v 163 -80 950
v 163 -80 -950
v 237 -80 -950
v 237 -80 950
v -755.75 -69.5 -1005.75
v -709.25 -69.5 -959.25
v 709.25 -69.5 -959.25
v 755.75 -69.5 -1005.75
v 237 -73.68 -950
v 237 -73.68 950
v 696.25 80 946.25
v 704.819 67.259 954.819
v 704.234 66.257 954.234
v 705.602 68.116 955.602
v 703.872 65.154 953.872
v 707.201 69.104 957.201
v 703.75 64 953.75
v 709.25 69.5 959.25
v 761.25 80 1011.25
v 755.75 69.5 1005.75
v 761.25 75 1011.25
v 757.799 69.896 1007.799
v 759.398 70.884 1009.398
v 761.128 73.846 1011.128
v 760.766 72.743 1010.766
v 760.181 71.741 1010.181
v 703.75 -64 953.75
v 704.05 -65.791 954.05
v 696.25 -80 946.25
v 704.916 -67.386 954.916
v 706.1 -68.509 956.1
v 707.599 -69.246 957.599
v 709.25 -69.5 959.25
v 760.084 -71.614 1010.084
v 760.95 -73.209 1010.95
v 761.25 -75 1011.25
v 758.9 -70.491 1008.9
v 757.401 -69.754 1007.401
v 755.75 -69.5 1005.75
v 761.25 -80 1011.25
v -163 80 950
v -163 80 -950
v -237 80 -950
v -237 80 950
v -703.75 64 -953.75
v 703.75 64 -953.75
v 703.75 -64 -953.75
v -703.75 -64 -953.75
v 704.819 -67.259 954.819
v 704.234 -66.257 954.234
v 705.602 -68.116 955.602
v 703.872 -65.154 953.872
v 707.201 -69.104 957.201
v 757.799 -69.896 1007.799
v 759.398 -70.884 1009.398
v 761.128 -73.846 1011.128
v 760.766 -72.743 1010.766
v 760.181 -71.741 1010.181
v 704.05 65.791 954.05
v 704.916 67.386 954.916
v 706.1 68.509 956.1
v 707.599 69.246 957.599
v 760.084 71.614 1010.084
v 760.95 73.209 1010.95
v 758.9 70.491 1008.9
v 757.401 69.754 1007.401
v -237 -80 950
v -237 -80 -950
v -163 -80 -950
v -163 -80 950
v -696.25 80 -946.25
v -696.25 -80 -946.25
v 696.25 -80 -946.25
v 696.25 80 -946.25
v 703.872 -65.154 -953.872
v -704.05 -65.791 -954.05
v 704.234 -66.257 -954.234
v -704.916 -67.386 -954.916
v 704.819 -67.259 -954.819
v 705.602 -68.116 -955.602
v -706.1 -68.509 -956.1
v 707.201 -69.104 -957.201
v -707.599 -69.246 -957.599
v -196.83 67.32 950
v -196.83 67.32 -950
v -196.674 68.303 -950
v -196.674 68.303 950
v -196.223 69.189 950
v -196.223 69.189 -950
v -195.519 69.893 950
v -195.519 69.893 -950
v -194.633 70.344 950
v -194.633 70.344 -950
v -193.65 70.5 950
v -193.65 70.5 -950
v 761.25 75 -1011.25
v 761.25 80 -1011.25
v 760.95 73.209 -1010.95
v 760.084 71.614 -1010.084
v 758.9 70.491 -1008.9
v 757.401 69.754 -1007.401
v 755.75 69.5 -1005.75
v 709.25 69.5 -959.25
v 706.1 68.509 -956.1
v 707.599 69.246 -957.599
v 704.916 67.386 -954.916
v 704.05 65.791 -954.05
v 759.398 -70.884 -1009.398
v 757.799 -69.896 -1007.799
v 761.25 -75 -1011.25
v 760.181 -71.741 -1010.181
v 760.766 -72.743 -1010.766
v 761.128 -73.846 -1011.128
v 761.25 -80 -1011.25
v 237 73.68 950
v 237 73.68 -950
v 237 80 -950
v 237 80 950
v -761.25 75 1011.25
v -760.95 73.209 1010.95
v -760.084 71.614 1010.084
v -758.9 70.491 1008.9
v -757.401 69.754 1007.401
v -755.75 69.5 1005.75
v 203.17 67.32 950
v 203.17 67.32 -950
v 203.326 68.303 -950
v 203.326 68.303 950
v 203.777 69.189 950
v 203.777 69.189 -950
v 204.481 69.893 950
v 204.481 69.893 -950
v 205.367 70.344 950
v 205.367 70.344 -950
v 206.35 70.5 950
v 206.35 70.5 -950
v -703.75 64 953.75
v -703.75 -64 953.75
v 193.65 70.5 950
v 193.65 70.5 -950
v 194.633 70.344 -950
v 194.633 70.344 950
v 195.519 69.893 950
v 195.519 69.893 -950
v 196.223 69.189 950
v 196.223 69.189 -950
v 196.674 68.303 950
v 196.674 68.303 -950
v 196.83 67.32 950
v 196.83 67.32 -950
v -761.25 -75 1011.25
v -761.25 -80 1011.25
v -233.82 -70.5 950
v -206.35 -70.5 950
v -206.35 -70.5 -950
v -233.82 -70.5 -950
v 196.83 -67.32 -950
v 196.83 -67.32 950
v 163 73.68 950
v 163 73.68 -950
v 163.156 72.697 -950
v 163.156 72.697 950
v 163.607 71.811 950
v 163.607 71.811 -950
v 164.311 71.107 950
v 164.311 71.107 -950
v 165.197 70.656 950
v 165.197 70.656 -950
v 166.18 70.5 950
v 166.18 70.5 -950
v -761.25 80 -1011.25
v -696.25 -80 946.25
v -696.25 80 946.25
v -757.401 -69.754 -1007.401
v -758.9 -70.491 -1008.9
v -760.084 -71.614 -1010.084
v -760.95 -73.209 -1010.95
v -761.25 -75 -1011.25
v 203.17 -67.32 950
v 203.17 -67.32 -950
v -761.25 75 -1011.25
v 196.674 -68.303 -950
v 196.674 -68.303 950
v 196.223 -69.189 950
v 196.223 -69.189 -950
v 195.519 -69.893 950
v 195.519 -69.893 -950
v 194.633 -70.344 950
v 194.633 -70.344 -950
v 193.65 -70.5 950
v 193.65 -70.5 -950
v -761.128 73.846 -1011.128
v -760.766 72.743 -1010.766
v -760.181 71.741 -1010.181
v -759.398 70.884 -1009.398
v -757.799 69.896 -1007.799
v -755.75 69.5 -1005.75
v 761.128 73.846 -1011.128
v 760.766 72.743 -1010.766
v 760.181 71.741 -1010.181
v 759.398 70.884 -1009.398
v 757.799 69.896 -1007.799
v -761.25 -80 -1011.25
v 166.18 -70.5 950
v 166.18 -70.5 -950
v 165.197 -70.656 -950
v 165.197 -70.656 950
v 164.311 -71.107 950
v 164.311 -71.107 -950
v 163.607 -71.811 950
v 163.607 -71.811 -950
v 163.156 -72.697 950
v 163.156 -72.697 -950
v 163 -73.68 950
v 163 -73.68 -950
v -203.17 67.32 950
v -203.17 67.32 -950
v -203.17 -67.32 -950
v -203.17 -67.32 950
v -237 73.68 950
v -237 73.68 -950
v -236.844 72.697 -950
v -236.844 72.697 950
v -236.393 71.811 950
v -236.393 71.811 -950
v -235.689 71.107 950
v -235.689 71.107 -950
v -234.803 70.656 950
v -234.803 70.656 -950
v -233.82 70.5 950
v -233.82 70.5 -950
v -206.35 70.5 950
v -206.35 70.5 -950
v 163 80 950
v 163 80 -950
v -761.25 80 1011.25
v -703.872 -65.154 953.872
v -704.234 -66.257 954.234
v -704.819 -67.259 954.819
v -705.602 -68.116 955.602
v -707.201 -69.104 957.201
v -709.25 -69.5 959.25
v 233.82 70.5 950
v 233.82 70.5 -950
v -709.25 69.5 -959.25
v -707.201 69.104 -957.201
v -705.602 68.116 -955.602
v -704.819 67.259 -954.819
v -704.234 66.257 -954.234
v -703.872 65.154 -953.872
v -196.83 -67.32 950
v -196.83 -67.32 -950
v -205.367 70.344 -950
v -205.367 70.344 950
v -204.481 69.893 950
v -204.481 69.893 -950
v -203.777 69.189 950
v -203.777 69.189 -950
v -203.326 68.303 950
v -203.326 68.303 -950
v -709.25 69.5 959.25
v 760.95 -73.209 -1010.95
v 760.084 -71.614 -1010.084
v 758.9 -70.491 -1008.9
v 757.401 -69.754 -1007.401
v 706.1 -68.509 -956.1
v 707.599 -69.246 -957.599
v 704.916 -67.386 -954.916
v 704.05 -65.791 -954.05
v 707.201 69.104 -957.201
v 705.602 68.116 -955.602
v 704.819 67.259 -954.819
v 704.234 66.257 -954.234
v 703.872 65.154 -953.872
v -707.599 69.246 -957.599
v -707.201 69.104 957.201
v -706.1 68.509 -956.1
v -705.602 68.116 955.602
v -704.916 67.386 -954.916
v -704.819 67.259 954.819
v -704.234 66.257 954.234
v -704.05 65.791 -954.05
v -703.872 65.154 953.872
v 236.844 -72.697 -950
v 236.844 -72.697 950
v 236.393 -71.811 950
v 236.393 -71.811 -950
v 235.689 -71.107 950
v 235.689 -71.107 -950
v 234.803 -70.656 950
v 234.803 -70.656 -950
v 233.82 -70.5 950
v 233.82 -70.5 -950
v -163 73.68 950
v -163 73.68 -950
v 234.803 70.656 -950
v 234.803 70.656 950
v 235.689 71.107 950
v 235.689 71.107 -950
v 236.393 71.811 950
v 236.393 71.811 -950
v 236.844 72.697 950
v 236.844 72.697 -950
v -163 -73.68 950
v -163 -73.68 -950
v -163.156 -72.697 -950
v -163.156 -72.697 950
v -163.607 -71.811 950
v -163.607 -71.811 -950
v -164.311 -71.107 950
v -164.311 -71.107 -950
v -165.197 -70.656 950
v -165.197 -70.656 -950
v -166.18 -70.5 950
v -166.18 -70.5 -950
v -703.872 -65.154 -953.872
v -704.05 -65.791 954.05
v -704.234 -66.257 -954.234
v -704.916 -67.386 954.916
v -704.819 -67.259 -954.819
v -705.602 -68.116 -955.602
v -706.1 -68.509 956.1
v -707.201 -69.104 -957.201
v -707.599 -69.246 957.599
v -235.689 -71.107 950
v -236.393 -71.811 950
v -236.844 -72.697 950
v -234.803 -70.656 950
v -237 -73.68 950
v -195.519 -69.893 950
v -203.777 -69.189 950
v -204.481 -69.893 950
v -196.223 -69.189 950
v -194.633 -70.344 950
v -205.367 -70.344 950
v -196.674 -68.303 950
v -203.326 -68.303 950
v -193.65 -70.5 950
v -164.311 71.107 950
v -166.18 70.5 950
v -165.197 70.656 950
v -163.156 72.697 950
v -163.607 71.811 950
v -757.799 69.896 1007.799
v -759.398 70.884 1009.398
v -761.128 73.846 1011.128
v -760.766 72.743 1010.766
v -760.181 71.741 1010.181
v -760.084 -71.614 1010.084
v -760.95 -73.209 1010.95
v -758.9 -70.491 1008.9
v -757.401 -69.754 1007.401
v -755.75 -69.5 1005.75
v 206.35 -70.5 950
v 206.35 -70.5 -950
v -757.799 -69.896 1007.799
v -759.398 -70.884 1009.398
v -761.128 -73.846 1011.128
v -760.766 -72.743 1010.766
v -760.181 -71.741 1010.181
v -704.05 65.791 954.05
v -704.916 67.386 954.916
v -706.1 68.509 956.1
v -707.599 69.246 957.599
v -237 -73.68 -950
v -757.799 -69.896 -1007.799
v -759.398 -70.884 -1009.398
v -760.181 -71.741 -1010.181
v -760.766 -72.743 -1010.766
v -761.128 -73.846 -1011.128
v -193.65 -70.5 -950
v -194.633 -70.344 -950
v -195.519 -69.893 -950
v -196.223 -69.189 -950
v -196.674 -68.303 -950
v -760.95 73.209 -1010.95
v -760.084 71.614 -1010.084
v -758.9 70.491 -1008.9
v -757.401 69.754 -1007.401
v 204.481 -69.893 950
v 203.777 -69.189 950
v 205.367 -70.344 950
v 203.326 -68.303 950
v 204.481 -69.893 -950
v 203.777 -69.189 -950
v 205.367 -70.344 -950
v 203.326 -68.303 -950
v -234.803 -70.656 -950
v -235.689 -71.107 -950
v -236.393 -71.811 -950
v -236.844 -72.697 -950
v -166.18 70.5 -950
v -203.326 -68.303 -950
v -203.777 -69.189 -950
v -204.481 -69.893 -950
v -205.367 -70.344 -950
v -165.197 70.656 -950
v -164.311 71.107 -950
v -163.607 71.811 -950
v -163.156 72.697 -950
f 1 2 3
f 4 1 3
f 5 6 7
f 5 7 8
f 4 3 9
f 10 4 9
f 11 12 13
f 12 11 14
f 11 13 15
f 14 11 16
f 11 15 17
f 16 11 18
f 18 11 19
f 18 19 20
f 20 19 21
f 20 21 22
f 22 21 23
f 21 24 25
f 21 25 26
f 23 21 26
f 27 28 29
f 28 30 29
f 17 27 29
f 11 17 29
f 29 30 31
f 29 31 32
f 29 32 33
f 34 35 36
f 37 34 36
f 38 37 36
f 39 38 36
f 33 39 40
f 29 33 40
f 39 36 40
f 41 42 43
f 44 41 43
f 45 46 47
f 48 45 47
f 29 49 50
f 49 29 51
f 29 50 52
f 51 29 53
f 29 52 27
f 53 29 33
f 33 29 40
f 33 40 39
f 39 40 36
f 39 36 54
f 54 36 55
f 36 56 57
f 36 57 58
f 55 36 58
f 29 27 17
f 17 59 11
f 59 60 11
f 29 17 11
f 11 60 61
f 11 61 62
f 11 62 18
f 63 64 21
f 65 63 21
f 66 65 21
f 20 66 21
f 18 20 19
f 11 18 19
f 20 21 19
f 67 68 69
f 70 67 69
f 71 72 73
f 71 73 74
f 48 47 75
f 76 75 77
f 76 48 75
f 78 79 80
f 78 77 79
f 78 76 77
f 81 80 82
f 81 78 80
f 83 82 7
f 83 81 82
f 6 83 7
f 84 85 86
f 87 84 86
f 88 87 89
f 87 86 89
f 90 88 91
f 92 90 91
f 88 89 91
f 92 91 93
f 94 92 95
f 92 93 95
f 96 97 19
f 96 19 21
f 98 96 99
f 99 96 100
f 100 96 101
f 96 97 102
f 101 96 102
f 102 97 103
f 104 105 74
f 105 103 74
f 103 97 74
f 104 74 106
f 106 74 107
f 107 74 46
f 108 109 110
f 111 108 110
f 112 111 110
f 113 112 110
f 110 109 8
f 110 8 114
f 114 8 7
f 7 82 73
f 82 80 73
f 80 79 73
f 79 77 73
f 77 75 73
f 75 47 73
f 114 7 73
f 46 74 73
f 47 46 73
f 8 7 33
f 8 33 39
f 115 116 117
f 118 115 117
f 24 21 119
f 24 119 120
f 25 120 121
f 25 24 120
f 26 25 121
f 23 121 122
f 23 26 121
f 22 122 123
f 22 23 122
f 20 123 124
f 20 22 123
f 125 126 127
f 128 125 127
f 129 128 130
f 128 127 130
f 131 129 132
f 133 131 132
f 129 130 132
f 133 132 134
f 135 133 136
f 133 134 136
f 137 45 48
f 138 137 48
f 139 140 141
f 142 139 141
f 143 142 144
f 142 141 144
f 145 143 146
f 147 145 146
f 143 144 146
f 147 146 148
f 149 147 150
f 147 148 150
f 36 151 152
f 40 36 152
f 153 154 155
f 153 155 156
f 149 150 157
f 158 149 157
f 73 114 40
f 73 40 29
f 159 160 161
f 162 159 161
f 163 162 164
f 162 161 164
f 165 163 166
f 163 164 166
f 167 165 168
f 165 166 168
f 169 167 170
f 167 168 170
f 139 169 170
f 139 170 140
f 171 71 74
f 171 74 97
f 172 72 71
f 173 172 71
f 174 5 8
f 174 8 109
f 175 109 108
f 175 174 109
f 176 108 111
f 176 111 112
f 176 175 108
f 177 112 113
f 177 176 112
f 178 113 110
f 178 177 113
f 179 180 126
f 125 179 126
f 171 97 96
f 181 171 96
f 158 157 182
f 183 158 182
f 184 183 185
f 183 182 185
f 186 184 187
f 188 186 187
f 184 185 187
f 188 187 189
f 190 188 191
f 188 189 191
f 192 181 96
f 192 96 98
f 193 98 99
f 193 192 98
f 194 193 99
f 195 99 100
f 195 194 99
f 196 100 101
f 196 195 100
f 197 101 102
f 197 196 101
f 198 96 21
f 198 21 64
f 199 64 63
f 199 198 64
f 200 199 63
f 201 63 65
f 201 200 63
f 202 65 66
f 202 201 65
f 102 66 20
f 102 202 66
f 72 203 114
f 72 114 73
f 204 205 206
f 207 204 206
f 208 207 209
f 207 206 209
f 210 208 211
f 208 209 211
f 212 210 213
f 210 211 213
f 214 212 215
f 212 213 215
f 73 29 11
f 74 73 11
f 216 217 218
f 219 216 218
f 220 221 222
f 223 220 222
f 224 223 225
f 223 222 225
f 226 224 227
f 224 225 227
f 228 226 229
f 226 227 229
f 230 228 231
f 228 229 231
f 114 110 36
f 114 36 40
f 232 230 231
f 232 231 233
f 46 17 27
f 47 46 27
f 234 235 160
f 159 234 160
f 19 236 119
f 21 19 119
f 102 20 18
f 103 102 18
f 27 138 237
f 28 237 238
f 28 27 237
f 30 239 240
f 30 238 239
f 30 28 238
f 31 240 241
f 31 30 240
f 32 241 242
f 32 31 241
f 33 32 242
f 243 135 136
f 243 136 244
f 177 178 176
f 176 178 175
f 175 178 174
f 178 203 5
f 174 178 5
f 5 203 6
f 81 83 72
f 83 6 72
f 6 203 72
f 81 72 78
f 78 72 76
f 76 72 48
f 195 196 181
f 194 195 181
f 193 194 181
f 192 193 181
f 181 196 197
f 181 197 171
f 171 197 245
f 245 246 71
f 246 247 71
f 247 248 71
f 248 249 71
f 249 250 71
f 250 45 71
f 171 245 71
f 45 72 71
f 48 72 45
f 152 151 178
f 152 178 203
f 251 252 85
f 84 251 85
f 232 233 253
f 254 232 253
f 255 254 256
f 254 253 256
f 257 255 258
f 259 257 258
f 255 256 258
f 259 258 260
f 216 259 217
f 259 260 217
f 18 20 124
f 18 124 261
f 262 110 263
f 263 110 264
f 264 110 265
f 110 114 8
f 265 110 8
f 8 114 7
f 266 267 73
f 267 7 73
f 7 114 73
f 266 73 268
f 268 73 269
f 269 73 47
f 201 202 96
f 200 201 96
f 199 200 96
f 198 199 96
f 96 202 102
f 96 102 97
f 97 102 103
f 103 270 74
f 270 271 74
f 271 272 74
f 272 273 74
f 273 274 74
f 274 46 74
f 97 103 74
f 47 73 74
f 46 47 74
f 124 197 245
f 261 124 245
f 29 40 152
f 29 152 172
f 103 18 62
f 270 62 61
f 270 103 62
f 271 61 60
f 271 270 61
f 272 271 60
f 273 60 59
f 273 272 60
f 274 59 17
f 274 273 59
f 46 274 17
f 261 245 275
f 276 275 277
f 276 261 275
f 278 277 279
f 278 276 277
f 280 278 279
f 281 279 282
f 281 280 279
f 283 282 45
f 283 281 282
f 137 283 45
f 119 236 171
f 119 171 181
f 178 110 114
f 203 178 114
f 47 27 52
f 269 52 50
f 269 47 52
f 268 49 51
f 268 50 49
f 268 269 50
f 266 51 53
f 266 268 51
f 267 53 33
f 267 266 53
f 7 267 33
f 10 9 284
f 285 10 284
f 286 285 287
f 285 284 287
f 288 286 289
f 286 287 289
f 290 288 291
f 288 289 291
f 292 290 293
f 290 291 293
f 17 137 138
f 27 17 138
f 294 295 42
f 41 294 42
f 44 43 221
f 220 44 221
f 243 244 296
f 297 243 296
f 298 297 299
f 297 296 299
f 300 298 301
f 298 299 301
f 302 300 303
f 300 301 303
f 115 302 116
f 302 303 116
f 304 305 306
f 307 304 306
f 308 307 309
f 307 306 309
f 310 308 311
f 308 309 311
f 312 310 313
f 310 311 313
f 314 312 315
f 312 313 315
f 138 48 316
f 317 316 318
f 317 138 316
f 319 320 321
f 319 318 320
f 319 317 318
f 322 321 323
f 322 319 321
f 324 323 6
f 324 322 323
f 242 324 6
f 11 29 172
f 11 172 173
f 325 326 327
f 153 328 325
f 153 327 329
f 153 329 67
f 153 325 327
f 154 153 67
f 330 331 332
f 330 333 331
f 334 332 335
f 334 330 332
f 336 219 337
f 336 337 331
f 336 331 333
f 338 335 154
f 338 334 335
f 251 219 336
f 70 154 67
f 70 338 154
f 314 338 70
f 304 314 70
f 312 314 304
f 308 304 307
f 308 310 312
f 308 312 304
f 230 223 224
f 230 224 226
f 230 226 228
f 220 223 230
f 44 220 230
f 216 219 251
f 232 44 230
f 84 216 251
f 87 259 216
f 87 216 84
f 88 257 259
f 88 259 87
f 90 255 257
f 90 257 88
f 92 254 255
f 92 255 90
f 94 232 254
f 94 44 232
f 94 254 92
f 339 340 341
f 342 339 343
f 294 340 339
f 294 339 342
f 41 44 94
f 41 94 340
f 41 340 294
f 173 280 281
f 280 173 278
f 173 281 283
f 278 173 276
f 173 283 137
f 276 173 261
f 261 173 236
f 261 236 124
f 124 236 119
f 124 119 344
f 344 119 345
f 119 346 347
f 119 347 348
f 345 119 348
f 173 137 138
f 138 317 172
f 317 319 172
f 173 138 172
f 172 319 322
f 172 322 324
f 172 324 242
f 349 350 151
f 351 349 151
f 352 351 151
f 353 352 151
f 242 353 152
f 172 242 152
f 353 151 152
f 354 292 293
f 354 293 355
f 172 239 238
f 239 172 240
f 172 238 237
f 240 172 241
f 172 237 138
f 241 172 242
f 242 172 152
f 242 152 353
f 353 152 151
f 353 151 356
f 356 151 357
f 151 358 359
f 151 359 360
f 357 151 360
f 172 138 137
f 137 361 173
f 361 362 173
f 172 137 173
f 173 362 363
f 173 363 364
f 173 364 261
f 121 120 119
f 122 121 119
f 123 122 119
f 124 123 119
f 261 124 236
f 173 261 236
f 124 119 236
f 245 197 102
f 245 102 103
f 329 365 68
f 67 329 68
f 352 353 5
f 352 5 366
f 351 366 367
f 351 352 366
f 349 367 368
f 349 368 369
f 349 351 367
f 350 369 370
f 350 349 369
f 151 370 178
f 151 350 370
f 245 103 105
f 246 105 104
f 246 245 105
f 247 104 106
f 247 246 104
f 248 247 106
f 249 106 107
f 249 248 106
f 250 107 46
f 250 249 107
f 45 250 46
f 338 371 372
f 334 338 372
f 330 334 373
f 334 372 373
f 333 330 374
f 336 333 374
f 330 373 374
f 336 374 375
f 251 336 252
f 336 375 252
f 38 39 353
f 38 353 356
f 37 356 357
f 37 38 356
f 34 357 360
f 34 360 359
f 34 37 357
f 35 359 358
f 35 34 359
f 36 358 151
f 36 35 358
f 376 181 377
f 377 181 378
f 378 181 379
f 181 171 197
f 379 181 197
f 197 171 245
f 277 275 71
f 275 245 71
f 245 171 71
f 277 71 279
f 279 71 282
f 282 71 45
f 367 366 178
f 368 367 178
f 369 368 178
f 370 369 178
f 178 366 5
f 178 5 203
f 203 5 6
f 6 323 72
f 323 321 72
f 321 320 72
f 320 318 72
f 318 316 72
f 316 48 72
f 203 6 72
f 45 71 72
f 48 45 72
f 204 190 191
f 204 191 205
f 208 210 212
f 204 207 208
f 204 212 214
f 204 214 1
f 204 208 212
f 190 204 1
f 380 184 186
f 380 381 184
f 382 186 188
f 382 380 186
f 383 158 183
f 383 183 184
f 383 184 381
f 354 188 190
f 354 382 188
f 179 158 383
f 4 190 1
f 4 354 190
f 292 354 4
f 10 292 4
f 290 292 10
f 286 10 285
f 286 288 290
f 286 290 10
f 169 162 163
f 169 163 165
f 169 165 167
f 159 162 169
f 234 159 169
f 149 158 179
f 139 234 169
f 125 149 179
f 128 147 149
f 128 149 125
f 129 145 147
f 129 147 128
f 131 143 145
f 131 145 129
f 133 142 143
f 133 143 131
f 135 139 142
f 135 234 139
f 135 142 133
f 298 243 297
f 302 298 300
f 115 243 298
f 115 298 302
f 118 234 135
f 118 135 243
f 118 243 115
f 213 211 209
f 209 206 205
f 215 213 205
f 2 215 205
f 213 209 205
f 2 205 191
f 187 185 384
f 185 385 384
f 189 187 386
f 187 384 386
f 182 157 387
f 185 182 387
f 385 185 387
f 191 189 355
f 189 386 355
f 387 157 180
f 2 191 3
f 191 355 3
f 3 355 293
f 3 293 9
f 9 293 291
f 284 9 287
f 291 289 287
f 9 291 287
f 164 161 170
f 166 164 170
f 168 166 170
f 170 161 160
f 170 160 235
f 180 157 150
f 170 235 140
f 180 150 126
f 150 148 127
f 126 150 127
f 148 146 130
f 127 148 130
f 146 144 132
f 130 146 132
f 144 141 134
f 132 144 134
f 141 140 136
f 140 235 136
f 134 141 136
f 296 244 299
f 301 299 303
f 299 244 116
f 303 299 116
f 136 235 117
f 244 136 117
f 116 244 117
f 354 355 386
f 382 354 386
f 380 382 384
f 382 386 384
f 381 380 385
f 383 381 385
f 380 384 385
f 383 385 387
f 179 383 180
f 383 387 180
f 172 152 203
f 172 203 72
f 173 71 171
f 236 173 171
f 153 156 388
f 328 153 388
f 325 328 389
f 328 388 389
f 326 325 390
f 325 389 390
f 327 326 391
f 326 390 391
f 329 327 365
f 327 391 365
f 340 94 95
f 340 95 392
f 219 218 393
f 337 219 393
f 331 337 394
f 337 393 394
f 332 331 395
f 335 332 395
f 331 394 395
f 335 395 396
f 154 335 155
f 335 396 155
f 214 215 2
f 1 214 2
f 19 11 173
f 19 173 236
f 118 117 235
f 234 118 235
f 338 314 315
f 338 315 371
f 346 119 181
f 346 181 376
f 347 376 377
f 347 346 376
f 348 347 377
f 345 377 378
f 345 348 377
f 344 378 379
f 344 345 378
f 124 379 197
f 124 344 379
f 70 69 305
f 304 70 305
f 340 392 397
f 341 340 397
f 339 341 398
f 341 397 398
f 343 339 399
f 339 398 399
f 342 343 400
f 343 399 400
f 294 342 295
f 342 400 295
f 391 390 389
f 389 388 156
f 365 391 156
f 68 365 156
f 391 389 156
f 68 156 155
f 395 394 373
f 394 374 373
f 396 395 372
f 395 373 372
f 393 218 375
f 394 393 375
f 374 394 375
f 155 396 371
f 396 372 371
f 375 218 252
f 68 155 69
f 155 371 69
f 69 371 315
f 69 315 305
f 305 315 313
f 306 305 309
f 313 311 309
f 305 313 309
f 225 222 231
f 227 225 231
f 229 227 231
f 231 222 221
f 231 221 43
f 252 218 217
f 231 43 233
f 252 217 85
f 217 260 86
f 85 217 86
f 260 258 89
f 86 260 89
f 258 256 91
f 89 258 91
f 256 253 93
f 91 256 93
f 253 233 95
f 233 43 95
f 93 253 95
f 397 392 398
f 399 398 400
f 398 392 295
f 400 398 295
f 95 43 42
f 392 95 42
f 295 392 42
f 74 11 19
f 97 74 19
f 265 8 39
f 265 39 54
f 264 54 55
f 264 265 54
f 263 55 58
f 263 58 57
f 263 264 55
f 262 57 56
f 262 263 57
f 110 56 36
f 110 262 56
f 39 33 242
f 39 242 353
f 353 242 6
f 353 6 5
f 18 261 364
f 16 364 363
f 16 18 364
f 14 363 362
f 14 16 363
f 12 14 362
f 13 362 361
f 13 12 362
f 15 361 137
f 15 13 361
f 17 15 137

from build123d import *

# Parameters (mm, degrees)
MIEMBRO_ESTRUCTURAL2_DEPTH      = 2001.754962657
MIEMBRO_ESTRUCTURAL2_DEPTH_BACK = 101.754962657
MIEMBRO_ESTRUCTURAL2_2_DEPTH    = 1603.509925314
MIEMBRO_ESTRUCTURAL2_3_DEPTH    = 2103.509925314
MIEMBRO_ESTRUCTURAL2_4_DEPTH    = 1603.509925314
MIEMBRO_ESTRUCTURAL4_DEPTH      = 1900
MIEMBRO_ESTRUCTURAL4_2_DEPTH    = 1900


with BuildPart() as part:
    # Croquis12 → Miembro estructural2 (new, two sides: drawn at the far end of the back side and taken through both)
    with BuildSketch(Plane(origin=(-700, 0, 950), x_dir=(-1, 0, 0), z_dir=(0, 0, -1)).offset(-MIEMBRO_ESTRUCTURAL2_DEPTH_BACK)):
        with BuildLine():
            Line((-3.75, -80), (-3.75, 80))
            Line((-3.75, 80), (61.25, 80))
            Line((61.25, 80), (61.25, 75))
            ThreePointArc((61.25, 75), (59.639087297, 71.110912703), (55.75, 69.5))
            Line((55.75, 69.5), (9.25, 69.5))
            ThreePointArc((9.25, 69.5), (5.360912703, 67.889087297), (3.75, 64))
            Line((3.75, 64), (3.75, -64))
            ThreePointArc((3.75, -64), (5.360912703, -67.889087297), (9.25, -69.5))
            Line((9.25, -69.5), (55.75, -69.5))
            ThreePointArc((55.75, -69.5), (59.639087297, -71.110912703), (61.25, -75))
            Line((61.25, -75), (61.25, -80))
            Line((61.25, -80), (-3.75, -80))
        make_face()
    extrude(amount=MIEMBRO_ESTRUCTURAL2_DEPTH + MIEMBRO_ESTRUCTURAL2_DEPTH_BACK)

    # Miembro estructural2 mitre 1
    split(bisect_by=Plane(origin=(-700, 0, 950), x_dir=(0, -1, 0), z_dir=(-0.707106781, 0, -0.707106781)), keep=Keep.TOP)

    # Miembro estructural2 mitre 2
    split(bisect_by=Plane(origin=(-700, 0, -950), x_dir=(0, -1, 0), z_dir=(-0.707106781, 0, 0.707106781)), keep=Keep.TOP)


with BuildPart() as body_2:
    # Croquis12 on segment 2 (carried to segment 2) → Miembro estructural2 2 (new body)
    with BuildSketch(Plane(origin=(-801.754962657, 0, -950), x_dir=(0, 0, -1), z_dir=(1, 0, 0))):
        with BuildLine():
            Line((-3.75, -80), (-3.75, 80))
            Line((-3.75, 80), (61.25, 80))
            Line((61.25, 80), (61.25, 75))
            ThreePointArc((61.25, 75), (59.639087297, 71.110912703), (55.75, 69.5))
            Line((55.75, 69.5), (9.25, 69.5))
            ThreePointArc((9.25, 69.5), (5.360912703, 67.889087297), (3.75, 64))
            Line((3.75, 64), (3.75, -64))
            ThreePointArc((3.75, -64), (5.360912703, -67.889087297), (9.25, -69.5))
            Line((9.25, -69.5), (55.75, -69.5))
            ThreePointArc((55.75, -69.5), (59.639087297, -71.110912703), (61.25, -75))
            Line((61.25, -75), (61.25, -80))
            Line((61.25, -80), (-3.75, -80))
        make_face()
    extrude(amount=MIEMBRO_ESTRUCTURAL2_2_DEPTH)

    # Miembro estructural2 2 mitre 1
    split(bisect_by=Plane(origin=(-700, 0, -950), x_dir=(0, 1, 0), z_dir=(0.707106781, 0, -0.707106781)), keep=Keep.TOP)

    # Miembro estructural2 2 mitre 2
    split(bisect_by=Plane(origin=(700, 0, -950), x_dir=(0, -1, 0), z_dir=(-0.707106781, 0, -0.707106781)), keep=Keep.TOP)


with BuildPart() as body_3:
    # Croquis12 on segment 3 (carried to segment 3) → Miembro estructural2 3 (new body)
    with BuildSketch(Plane(origin=(700, 0, -1051.754962657), x_dir=(1, 0, 0), z_dir=(0, 0, 1))):
        with BuildLine():
            Line((-3.75, -80), (-3.75, 80))
            Line((-3.75, 80), (61.25, 80))
            Line((61.25, 80), (61.25, 75))
            ThreePointArc((61.25, 75), (59.639087297, 71.110912703), (55.75, 69.5))
            Line((55.75, 69.5), (9.25, 69.5))
            ThreePointArc((9.25, 69.5), (5.360912703, 67.889087297), (3.75, 64))
            Line((3.75, 64), (3.75, -64))
            ThreePointArc((3.75, -64), (5.360912703, -67.889087297), (9.25, -69.5))
            Line((9.25, -69.5), (55.75, -69.5))
            ThreePointArc((55.75, -69.5), (59.639087297, -71.110912703), (61.25, -75))
            Line((61.25, -75), (61.25, -80))
            Line((61.25, -80), (-3.75, -80))
        make_face()
    extrude(amount=MIEMBRO_ESTRUCTURAL2_3_DEPTH)

    # Miembro estructural2 3 mitre 1
    split(bisect_by=Plane(origin=(700, 0, 950), x_dir=(0, 1, 0), z_dir=(0.707106781, 0, -0.707106781)), keep=Keep.TOP)

    # Miembro estructural2 3 mitre 2
    split(bisect_by=Plane(origin=(700, 0, -950), x_dir=(0, 1, 0), z_dir=(0.707106781, 0, 0.707106781)), keep=Keep.TOP)


with BuildPart() as body_4:
    # Croquis12 on segment 4 (carried to segment 4) → Miembro estructural2 4 (new body)
    with BuildSketch(Plane(origin=(801.754962657, 0, 950), x_dir=(0, 0, 1), z_dir=(-1, 0, 0))):
        with BuildLine():
            Line((-3.75, -80), (-3.75, 80))
            Line((-3.75, 80), (61.25, 80))
            Line((61.25, 80), (61.25, 75))
            ThreePointArc((61.25, 75), (59.639087297, 71.110912703), (55.75, 69.5))
            Line((55.75, 69.5), (9.25, 69.5))
            ThreePointArc((9.25, 69.5), (5.360912703, 67.889087297), (3.75, 64))
            Line((3.75, 64), (3.75, -64))
            ThreePointArc((3.75, -64), (5.360912703, -67.889087297), (9.25, -69.5))
            Line((9.25, -69.5), (55.75, -69.5))
            ThreePointArc((55.75, -69.5), (59.639087297, -71.110912703), (61.25, -75))
            Line((61.25, -75), (61.25, -80))
            Line((61.25, -80), (-3.75, -80))
        make_face()
    extrude(amount=MIEMBRO_ESTRUCTURAL2_4_DEPTH)

    # Miembro estructural2 4 mitre 1
    split(bisect_by=Plane(origin=(-700, 0, 950), x_dir=(0, 1, 0), z_dir=(0.707106781, 0, 0.707106781)), keep=Keep.TOP)

    # Miembro estructural2 4 mitre 2
    split(bisect_by=Plane(origin=(700, 0, 950), x_dir=(0, -1, 0), z_dir=(-0.707106781, 0, 0.707106781)), keep=Keep.TOP)


with BuildPart() as body_5:
    # Croquis2 → Miembro estructural4 (new body)
    with BuildSketch(Plane(origin=(-200, 0, -950), x_dir=(1, 0, 0), z_dir=(0, 0, 1))):
        with BuildLine():
            Line((37, 80), (-37, 80))
            Line((-37, 80), (-37, 73.68))
            ThreePointArc((-37, 73.68), (-36.068599564, 71.431400436), (-33.82, 70.5))
            Line((-33.82, 70.5), (-6.35, 70.5))
            ThreePointArc((-6.35, 70.5), (-4.101400436, 69.568599564), (-3.17, 67.32))
            Line((-3.17, 67.32), (-3.17, -67.32))
            ThreePointArc((-3.17, -67.32), (-4.101400436, -69.568599564), (-6.35, -70.5))
            Line((-6.35, -70.5), (-33.82, -70.5))
            ThreePointArc((-33.82, -70.5), (-36.068599564, -71.431400436), (-37, -73.68))
            Line((-37, -73.68), (-37, -80))
            Line((-37, -80), (37, -80))
            Line((37, -80), (37, -73.68))
            ThreePointArc((37, -73.68), (36.068599564, -71.431400436), (33.82, -70.5))
            Line((33.82, -70.5), (6.35, -70.5))
            ThreePointArc((6.35, -70.5), (4.101400436, -69.568599564), (3.17, -67.32))
            Line((3.17, -67.32), (3.17, 67.32))
            ThreePointArc((3.17, 67.32), (4.101400436, 69.568599564), (6.35, 70.5))
            Line((6.35, 70.5), (33.82, 70.5))
            ThreePointArc((33.82, 70.5), (36.068599564, 71.431400436), (37, 73.68))
            Line((37, 73.68), (37, 80))
        make_face()
    extrude(amount=MIEMBRO_ESTRUCTURAL4_DEPTH)


with BuildPart() as body_6:
    # Croquis2 on segment 2 (carried to segment 2) → Miembro estructural4 2 (new body)
    with BuildSketch(Plane(origin=(200, 0, -950), x_dir=(1, 0, 0), z_dir=(0, 0, 1))):
        with BuildLine():
            Line((37, 80), (-37, 80))
            Line((-37, 80), (-37, 73.68))
            ThreePointArc((-37, 73.68), (-36.068599564, 71.431400436), (-33.82, 70.5))
            Line((-33.82, 70.5), (-6.35, 70.5))
            ThreePointArc((-6.35, 70.5), (-4.101400436, 69.568599564), (-3.17, 67.32))
            Line((-3.17, 67.32), (-3.17, -67.32))
            ThreePointArc((-3.17, -67.32), (-4.101400436, -69.568599564), (-6.35, -70.5))
            Line((-6.35, -70.5), (-33.82, -70.5))
            ThreePointArc((-33.82, -70.5), (-36.068599564, -71.431400436), (-37, -73.68))
            Line((-37, -73.68), (-37, -80))
            Line((-37, -80), (37, -80))
            Line((37, -80), (37, -73.68))
            ThreePointArc((37, -73.68), (36.068599564, -71.431400436), (33.82, -70.5))
            Line((33.82, -70.5), (6.35, -70.5))
            ThreePointArc((6.35, -70.5), (4.101400436, -69.568599564), (3.17, -67.32))
            Line((3.17, -67.32), (3.17, 67.32))
            ThreePointArc((3.17, 67.32), (4.101400436, 69.568599564), (6.35, 70.5))
            Line((6.35, 70.5), (33.82, 70.5))
            ThreePointArc((33.82, 70.5), (36.068599564, 71.431400436), (37, 73.68))
            Line((37, 73.68), (37, 80))
        make_face()
    extrude(amount=MIEMBRO_ESTRUCTURAL4_2_DEPTH)


solid = Compound([part.part, body_2.part, body_3.part, body_4.part, body_5.part, body_6.part])
